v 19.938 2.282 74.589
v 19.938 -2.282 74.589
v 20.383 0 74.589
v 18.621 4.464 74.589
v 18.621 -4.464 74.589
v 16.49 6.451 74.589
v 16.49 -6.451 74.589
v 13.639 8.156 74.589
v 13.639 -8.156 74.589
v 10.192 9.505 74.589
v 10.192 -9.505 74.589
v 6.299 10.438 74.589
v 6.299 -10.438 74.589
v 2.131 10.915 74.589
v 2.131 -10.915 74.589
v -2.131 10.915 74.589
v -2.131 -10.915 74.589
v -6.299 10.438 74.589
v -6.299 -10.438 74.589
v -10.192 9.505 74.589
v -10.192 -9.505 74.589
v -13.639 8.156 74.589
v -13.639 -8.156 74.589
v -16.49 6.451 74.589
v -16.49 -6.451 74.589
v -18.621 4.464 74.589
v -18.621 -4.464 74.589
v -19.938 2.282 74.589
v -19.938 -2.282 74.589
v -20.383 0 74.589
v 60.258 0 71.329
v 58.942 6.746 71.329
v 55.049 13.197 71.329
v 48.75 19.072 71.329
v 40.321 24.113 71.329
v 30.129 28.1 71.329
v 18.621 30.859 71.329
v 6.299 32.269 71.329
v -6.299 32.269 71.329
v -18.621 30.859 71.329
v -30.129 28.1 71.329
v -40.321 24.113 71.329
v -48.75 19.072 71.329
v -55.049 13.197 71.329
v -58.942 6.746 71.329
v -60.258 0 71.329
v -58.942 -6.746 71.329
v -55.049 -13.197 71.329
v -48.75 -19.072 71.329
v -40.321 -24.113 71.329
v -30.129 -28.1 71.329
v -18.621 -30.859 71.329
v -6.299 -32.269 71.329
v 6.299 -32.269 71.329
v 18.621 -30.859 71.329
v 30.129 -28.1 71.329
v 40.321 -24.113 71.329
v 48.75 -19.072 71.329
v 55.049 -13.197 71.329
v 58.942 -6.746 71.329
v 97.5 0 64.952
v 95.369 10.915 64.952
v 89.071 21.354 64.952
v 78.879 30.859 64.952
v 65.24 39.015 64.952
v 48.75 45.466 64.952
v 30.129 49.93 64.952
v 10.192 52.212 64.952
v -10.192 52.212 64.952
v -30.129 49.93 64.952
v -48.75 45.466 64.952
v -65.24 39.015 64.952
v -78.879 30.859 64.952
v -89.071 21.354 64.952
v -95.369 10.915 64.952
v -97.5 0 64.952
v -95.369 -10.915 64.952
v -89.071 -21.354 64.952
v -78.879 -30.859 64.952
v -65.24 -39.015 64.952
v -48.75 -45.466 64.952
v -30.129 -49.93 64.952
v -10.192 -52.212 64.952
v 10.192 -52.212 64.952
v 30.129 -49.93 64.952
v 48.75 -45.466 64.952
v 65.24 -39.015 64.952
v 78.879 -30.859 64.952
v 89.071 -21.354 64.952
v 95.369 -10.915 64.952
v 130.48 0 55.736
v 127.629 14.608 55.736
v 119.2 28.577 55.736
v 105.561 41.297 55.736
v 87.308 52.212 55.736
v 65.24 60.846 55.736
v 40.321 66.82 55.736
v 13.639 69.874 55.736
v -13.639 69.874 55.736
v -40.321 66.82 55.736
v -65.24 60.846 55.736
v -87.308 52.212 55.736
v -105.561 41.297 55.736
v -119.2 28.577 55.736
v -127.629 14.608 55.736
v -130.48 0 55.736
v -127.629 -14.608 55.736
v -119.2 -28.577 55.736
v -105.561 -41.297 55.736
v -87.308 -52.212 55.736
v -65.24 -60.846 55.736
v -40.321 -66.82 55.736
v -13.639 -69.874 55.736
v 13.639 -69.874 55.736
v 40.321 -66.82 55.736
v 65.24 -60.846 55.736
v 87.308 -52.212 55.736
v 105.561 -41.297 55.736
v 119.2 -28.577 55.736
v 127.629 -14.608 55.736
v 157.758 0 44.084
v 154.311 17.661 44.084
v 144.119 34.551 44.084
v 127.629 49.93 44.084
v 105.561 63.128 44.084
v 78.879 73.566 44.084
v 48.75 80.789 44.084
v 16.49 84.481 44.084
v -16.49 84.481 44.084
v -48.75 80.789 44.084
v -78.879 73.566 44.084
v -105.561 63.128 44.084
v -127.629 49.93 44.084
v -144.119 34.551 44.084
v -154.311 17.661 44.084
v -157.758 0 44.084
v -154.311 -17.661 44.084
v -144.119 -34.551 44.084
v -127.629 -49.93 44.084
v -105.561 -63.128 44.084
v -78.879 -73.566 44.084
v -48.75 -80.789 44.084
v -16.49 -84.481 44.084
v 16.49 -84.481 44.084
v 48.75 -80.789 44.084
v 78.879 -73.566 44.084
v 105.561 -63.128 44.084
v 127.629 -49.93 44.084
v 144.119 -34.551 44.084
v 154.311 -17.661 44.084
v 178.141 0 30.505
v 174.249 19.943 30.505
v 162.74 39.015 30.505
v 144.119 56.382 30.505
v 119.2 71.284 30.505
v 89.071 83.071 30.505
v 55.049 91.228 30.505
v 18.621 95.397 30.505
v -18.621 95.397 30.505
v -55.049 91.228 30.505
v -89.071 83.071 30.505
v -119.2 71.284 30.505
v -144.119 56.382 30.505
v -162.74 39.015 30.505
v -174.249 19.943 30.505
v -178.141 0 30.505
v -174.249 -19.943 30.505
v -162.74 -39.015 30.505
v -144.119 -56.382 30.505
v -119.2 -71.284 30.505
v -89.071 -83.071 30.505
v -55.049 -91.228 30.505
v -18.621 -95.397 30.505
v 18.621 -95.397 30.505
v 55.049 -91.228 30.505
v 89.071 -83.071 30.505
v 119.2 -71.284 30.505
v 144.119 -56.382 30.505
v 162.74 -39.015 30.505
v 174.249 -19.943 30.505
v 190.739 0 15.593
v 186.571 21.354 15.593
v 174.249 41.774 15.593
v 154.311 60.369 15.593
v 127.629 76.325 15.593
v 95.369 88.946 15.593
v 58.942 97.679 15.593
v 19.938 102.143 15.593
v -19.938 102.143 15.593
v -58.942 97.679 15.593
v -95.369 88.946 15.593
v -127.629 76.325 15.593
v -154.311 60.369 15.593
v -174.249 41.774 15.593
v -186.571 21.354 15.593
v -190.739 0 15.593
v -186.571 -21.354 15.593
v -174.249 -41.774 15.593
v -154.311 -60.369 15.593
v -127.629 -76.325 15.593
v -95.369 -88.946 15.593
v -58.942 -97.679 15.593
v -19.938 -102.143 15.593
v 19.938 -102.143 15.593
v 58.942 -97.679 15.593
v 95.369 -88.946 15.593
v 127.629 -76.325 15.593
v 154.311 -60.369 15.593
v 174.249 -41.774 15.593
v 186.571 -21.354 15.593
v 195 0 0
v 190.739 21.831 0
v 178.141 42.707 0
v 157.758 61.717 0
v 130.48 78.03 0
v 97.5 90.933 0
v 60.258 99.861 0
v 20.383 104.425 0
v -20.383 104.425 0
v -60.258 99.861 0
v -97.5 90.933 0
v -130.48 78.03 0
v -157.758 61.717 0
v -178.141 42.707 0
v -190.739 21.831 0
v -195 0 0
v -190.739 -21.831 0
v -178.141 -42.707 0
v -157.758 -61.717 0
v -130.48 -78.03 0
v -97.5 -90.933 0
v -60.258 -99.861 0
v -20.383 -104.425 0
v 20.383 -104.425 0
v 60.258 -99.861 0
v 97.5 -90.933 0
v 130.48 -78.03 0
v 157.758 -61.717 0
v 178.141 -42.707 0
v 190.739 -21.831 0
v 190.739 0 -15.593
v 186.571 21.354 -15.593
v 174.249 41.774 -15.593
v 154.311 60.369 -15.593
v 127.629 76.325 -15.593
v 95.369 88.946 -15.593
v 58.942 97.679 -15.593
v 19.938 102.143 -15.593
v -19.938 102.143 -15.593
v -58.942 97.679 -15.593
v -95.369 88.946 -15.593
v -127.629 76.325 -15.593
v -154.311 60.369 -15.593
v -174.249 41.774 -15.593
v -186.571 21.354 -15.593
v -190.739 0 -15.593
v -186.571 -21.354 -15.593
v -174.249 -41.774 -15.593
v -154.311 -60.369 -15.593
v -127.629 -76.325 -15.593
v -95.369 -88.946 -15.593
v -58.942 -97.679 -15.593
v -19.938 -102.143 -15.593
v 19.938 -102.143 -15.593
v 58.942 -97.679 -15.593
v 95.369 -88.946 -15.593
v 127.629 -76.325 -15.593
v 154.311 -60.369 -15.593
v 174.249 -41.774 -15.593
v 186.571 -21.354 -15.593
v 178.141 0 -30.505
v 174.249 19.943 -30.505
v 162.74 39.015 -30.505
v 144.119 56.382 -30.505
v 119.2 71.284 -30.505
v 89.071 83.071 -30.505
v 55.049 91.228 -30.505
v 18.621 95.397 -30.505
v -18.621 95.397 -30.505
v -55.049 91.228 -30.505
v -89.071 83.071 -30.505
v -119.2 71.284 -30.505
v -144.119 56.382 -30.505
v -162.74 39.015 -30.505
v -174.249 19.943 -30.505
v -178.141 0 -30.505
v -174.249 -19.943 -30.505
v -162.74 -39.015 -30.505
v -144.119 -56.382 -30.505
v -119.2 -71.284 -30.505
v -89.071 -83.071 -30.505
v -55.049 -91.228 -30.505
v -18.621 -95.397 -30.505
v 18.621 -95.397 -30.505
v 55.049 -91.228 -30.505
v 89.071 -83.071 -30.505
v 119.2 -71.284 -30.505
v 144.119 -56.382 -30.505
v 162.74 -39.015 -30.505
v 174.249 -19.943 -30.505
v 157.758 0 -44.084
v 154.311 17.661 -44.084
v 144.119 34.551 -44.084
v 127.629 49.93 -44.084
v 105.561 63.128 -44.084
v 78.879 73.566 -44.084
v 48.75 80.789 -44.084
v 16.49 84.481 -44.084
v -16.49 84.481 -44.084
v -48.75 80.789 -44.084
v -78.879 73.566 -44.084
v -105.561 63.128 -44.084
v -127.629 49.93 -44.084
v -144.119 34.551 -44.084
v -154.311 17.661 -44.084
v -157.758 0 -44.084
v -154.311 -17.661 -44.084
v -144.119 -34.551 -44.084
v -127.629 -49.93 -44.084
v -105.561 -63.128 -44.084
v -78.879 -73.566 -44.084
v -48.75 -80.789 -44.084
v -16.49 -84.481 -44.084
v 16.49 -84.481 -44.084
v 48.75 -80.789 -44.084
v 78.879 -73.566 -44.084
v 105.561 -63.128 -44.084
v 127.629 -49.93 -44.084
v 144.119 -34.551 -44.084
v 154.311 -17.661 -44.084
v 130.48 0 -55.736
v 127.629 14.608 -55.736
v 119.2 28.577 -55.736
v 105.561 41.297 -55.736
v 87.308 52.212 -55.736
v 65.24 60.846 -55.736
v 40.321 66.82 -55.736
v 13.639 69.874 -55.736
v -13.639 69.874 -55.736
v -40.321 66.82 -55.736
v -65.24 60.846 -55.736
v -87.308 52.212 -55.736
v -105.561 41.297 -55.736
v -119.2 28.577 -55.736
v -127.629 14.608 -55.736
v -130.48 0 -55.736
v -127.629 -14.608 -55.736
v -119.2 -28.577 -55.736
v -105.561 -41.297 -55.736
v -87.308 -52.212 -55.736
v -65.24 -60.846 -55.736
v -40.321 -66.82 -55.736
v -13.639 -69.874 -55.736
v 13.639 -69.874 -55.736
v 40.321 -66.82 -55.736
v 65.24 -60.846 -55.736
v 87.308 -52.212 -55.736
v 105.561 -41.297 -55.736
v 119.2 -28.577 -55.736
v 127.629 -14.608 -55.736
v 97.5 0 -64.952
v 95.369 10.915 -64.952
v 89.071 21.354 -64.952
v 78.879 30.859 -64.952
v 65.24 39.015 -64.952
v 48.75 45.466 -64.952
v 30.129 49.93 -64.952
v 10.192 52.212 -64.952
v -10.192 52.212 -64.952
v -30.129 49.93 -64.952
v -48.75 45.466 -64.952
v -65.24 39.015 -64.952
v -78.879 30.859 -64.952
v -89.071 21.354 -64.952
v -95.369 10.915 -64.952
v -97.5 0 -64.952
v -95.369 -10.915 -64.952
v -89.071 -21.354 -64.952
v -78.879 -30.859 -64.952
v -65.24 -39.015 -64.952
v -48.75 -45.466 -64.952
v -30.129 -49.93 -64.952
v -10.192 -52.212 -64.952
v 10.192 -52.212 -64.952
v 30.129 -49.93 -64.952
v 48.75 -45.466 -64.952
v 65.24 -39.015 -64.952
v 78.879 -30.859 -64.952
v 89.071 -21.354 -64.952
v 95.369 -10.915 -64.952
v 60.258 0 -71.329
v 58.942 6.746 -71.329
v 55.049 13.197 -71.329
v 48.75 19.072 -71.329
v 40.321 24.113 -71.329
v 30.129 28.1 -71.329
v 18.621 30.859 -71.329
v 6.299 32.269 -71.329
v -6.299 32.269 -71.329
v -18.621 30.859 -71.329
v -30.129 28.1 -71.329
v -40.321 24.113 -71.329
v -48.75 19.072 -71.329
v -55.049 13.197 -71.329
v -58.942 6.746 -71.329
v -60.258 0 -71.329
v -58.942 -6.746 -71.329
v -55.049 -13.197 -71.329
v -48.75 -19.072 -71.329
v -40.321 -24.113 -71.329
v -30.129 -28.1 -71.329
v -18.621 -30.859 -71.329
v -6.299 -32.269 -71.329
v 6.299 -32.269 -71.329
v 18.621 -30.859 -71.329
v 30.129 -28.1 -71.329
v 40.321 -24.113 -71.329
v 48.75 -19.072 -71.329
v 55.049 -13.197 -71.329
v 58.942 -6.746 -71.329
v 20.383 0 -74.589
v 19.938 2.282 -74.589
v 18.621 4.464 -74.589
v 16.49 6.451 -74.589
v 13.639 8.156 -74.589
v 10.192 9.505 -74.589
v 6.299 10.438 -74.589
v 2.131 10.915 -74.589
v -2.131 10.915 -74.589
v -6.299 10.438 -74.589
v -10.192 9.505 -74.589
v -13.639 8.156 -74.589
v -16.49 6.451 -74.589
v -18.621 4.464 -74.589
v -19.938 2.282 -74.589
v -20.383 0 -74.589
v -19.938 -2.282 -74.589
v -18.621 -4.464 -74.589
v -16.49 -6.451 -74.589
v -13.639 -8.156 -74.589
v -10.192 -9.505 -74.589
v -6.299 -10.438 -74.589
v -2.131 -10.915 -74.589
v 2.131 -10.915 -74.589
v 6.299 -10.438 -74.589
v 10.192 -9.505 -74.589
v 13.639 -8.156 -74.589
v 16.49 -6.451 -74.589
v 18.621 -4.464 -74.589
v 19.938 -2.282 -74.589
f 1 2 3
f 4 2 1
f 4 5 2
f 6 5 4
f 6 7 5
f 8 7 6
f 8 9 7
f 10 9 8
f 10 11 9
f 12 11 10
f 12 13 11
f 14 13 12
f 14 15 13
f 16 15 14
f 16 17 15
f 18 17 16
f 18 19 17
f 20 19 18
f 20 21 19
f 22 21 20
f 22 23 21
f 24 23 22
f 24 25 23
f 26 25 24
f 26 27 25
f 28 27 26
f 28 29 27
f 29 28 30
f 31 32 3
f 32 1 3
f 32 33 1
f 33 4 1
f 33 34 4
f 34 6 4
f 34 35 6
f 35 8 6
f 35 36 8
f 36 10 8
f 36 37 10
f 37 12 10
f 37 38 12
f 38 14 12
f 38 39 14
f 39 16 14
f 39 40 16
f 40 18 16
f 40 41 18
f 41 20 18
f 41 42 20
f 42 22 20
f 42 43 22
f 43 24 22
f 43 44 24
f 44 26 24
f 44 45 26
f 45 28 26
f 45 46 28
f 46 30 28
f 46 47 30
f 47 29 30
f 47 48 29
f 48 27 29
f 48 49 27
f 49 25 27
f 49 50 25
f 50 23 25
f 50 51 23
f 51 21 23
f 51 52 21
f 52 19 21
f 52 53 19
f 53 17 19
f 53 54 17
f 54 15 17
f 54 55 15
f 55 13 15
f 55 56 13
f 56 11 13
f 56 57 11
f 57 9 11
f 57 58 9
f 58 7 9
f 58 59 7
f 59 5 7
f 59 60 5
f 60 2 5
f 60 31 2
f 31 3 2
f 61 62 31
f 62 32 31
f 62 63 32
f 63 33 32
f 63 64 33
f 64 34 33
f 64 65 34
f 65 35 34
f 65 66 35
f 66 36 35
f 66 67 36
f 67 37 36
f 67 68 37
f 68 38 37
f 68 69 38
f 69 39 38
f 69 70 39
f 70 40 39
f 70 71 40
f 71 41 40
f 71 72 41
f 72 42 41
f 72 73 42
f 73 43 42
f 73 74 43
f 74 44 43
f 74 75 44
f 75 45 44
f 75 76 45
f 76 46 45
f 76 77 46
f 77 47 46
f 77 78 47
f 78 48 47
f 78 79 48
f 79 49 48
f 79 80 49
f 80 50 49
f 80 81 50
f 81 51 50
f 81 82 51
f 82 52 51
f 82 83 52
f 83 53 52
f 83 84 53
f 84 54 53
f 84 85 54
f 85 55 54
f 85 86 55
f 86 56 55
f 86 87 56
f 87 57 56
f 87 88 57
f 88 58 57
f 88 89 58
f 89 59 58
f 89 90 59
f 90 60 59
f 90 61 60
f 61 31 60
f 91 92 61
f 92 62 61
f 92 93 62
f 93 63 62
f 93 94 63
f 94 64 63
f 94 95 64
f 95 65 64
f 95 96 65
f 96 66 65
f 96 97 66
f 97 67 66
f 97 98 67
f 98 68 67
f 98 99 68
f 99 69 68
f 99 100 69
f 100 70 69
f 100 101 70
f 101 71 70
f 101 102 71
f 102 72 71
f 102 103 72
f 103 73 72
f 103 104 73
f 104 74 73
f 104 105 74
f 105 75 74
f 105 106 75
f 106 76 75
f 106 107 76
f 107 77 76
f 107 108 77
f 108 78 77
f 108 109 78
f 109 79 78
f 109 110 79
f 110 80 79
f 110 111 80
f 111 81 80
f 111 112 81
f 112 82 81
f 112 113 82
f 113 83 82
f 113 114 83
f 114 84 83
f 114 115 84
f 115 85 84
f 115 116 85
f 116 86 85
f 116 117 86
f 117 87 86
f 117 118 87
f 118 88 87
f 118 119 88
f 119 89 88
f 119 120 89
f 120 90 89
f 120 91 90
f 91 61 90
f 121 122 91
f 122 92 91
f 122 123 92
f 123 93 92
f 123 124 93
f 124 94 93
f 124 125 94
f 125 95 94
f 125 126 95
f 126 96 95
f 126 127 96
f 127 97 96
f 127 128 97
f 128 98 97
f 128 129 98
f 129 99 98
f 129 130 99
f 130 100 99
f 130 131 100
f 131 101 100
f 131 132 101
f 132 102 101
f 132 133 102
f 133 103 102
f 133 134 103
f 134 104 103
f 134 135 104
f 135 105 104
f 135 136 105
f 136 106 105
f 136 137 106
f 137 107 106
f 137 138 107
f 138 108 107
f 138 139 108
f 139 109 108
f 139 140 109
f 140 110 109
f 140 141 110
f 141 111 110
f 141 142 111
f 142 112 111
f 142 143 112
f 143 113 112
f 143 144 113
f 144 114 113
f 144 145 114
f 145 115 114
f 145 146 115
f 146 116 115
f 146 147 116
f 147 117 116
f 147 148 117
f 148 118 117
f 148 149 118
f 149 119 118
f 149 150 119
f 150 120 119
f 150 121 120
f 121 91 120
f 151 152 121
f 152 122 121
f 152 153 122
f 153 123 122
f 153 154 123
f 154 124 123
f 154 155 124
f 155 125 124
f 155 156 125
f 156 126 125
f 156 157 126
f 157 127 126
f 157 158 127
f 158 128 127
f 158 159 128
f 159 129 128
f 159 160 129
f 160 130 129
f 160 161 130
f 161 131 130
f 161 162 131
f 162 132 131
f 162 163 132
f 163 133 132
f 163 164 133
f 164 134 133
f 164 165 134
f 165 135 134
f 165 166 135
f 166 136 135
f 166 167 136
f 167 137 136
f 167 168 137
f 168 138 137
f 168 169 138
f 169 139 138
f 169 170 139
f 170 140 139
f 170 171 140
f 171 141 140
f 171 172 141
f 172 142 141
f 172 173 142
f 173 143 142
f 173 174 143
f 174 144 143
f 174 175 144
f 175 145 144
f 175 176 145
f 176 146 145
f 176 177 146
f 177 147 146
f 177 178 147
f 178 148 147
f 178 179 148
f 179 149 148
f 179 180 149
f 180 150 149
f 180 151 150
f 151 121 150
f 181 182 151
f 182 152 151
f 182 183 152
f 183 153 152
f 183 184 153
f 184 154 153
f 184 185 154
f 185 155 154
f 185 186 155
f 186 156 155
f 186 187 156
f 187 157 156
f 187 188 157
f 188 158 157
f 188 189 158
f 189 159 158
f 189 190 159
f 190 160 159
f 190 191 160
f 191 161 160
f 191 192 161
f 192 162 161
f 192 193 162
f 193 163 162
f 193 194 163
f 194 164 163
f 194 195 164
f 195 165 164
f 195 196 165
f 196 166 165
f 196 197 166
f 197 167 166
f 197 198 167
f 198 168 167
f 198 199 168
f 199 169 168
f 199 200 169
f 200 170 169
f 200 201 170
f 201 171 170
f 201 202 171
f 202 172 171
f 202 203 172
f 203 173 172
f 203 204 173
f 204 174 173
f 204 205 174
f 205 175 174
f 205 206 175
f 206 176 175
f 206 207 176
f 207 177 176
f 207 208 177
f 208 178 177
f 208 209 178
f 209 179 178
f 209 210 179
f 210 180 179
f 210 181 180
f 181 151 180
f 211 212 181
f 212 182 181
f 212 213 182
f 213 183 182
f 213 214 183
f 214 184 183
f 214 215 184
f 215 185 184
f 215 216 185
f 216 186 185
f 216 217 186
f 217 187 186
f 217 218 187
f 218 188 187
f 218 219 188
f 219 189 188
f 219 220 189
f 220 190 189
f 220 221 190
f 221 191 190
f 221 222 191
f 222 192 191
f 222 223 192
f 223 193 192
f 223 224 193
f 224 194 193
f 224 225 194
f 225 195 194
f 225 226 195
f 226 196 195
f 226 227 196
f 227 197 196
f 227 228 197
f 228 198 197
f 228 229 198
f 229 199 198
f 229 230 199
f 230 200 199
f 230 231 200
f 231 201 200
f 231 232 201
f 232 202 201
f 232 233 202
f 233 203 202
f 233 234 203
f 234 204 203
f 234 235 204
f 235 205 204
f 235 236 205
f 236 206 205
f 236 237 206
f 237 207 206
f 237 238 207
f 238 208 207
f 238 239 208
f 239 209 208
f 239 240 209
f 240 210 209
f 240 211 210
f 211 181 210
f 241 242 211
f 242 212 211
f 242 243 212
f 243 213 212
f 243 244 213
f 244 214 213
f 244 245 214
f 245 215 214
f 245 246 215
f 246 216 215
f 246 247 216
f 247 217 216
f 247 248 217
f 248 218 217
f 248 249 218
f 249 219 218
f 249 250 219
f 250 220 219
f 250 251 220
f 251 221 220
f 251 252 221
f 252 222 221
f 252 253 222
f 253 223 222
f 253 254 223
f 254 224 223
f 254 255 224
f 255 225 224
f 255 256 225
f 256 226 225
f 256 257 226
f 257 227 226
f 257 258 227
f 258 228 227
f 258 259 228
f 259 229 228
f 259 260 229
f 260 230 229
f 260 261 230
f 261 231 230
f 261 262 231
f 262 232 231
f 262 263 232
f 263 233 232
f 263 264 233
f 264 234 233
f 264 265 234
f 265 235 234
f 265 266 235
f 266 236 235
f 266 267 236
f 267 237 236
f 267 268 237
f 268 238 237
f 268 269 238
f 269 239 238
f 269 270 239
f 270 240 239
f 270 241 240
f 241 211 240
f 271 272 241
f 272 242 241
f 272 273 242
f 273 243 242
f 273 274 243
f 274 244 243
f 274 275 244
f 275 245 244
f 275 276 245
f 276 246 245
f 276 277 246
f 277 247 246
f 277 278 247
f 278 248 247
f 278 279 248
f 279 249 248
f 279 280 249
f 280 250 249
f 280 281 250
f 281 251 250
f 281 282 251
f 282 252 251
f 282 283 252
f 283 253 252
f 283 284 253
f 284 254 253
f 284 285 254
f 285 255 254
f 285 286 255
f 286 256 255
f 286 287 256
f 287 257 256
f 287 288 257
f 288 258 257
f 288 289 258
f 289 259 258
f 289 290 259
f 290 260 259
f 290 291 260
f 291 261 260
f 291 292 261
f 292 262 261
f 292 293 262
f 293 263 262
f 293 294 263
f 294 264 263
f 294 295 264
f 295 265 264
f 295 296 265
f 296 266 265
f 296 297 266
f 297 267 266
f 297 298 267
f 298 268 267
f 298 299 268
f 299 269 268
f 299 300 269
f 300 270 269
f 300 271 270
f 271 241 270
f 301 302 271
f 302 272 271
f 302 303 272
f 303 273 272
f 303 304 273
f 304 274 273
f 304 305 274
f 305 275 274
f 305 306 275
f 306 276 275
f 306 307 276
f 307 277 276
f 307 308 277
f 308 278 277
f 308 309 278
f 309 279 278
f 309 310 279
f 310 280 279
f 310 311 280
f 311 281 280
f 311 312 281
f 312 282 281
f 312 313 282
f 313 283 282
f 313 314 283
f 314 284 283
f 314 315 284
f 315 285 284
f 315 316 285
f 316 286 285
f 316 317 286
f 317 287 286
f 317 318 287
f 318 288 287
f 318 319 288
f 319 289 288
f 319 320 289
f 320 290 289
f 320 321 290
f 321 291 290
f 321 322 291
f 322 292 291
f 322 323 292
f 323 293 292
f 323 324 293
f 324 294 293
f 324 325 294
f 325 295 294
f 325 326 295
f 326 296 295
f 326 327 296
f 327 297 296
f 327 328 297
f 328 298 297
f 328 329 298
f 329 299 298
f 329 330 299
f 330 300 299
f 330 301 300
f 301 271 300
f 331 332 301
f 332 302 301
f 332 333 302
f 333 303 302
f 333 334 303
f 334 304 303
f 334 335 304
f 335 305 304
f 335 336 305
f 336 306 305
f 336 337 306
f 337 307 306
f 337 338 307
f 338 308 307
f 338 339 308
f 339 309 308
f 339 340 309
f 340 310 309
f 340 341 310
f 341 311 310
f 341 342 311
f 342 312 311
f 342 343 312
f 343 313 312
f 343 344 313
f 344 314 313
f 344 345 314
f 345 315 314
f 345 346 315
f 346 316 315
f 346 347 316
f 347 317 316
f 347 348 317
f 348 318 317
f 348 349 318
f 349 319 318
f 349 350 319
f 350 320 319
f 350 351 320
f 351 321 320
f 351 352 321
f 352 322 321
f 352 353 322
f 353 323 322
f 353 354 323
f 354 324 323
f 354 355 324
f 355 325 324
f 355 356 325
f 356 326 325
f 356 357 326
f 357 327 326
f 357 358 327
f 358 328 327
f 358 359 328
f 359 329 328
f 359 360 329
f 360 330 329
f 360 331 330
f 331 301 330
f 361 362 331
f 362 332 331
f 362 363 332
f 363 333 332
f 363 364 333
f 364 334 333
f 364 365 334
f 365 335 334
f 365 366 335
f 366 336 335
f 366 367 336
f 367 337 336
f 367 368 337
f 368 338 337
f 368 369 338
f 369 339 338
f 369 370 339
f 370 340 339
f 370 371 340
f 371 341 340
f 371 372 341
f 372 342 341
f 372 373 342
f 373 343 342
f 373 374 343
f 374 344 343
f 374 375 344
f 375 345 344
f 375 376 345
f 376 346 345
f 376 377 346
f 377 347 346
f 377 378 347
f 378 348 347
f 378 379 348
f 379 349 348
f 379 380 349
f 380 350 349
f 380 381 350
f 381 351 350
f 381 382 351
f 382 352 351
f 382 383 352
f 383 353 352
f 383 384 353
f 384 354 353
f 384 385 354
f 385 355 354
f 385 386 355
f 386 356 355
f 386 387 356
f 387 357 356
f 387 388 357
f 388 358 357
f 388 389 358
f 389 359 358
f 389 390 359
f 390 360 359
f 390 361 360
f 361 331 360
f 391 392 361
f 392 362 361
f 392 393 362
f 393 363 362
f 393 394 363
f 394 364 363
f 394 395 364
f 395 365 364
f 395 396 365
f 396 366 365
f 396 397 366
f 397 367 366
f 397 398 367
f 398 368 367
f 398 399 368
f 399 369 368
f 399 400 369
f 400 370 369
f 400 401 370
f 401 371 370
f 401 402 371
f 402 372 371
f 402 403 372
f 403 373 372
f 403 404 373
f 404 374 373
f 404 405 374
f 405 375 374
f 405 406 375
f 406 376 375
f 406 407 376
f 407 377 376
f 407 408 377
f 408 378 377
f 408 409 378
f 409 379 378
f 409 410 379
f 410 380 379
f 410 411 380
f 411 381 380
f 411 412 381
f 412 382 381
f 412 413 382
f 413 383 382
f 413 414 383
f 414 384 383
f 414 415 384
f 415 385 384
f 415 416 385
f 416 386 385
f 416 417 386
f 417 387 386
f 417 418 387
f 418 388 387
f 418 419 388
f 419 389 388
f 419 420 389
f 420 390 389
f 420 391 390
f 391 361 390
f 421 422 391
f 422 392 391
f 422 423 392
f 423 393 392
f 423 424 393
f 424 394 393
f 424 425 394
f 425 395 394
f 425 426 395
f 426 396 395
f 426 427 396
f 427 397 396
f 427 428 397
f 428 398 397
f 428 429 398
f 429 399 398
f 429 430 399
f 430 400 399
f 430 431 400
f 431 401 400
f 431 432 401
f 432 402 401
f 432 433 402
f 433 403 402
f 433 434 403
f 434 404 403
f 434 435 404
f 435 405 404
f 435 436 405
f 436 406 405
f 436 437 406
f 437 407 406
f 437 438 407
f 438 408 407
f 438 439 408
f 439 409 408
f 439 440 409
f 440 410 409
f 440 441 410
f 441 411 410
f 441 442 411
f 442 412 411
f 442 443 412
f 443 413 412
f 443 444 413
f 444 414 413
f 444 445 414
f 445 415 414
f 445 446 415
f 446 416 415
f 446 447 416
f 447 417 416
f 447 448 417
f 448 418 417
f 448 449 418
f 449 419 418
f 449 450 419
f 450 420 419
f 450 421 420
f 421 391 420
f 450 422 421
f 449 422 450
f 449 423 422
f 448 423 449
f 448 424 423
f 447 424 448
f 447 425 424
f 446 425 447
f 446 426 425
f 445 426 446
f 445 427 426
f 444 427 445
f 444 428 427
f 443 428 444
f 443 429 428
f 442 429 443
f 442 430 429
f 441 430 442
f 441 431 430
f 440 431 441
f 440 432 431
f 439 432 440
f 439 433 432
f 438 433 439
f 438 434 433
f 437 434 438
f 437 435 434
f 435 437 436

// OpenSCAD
// Generated by SolidPython 1.0.1 on 2020-07-29 00:46:50


scale(v = [13, 7, 5]) {
	sphere(r = 15);
}
/***********************************************
*********      SolidPython code:      **********
************************************************
 
# import packages: SolidPython
from solid import *
from solid.utils import *
from itertools import chain, combinations, permutations


class Resize:

    def __init__(self, scad_file):
        self.scad_file = scad_file
        #self.scad_file = import_scad(scad_file)
        # cone/cylinder param:
        self.r1 = 0
        self.r2 = 0
        self.h = 0
        # rectangular prism param:
        self.w = 0
        self.l = 0
        # ellipse param:
        self.r = 0

    # import OpenScad code (file name corresponds to shape)


    # classify shape + parameters
    def assign(self, param1, param2, param3):
        if self.scad_file == 'cone.scad':
            self.r1 = param1
            self.r2 = param2
            self.h = param3
        elif self.scad_file == 'cylinder.scad':
            self.r1 = param1
            self.r2 = param2
            self.h = param3
        elif self.scad_file == 'rectangularPrism.scad':
            self.h = param1
            self.l = param2
            self.w = param3
        else:
            self.r = param1
            self.h = param2

    # resize parameters
    def iterate(self):
        x = range(3, 20, 2)
        i = 1
        if self.scad_file == 'cone.scad':
            tempList = list(permutations(x, 2))
            for temp in tempList:
                param1 = temp[0]
                param2 = temp[1]
                filepath = 'produced_scad_files/' + 'cone' + str(param1) + '_' + str(param2) + '_' + '.scad'
                scad_render_to_file(cylinder(h=param1, r1=param2, r2=0), filepath)

        elif self.scad_file == 'cylinder.scad':
            tempList = list(permutations(x, 3))
            for temp in tempList:
                param1 = temp[0]
                param2 = temp[1]
                filepath = 'produced_scad_files/' + 'cylinder' + str(param1) + '_' + str(param2) + '_' + '.scad'
                scad_render_to_file(cylinder(h=param1, r1=param2, r2=param2), filepath)

        elif self.scad_file == 'rectangularPrism.scad':
            tempList = list(permutations(x, 3))
            for temp in tempList:
                param1 = temp[0]
                param2 = temp[1]
                param3 = temp[2]
                filepath = 'produced_scad_files/' + 'rectangularPrism' + str(param1) + '_' + str(param2) + '_' + str(
                    param3) + '.scad'
                scad_render_to_file(cube(size=(param1, param2, param3)), filepath)

        elif self.scad_file == 'ellipse.scad':
            tempList = list(permutations(x, 4))
            for temp in tempList:
                param1 = temp[0]
                param2 = temp[1]
                param3 = temp[2]
                param4 = temp[3]
                filepath = 'produced_scad_files/' + 'ellipse' + str(param1) + '_' + str(param2) + '_' + str(param3) + '_' + str(param4) + '.scad'
                scad_render_to_file(scale([param1, param2, param3])(sphere(r=param4)), filepath)

    def render_to_scadfile(self):
        scad_render_to_file(scad, 'example.scad') 
 
************************************************/
